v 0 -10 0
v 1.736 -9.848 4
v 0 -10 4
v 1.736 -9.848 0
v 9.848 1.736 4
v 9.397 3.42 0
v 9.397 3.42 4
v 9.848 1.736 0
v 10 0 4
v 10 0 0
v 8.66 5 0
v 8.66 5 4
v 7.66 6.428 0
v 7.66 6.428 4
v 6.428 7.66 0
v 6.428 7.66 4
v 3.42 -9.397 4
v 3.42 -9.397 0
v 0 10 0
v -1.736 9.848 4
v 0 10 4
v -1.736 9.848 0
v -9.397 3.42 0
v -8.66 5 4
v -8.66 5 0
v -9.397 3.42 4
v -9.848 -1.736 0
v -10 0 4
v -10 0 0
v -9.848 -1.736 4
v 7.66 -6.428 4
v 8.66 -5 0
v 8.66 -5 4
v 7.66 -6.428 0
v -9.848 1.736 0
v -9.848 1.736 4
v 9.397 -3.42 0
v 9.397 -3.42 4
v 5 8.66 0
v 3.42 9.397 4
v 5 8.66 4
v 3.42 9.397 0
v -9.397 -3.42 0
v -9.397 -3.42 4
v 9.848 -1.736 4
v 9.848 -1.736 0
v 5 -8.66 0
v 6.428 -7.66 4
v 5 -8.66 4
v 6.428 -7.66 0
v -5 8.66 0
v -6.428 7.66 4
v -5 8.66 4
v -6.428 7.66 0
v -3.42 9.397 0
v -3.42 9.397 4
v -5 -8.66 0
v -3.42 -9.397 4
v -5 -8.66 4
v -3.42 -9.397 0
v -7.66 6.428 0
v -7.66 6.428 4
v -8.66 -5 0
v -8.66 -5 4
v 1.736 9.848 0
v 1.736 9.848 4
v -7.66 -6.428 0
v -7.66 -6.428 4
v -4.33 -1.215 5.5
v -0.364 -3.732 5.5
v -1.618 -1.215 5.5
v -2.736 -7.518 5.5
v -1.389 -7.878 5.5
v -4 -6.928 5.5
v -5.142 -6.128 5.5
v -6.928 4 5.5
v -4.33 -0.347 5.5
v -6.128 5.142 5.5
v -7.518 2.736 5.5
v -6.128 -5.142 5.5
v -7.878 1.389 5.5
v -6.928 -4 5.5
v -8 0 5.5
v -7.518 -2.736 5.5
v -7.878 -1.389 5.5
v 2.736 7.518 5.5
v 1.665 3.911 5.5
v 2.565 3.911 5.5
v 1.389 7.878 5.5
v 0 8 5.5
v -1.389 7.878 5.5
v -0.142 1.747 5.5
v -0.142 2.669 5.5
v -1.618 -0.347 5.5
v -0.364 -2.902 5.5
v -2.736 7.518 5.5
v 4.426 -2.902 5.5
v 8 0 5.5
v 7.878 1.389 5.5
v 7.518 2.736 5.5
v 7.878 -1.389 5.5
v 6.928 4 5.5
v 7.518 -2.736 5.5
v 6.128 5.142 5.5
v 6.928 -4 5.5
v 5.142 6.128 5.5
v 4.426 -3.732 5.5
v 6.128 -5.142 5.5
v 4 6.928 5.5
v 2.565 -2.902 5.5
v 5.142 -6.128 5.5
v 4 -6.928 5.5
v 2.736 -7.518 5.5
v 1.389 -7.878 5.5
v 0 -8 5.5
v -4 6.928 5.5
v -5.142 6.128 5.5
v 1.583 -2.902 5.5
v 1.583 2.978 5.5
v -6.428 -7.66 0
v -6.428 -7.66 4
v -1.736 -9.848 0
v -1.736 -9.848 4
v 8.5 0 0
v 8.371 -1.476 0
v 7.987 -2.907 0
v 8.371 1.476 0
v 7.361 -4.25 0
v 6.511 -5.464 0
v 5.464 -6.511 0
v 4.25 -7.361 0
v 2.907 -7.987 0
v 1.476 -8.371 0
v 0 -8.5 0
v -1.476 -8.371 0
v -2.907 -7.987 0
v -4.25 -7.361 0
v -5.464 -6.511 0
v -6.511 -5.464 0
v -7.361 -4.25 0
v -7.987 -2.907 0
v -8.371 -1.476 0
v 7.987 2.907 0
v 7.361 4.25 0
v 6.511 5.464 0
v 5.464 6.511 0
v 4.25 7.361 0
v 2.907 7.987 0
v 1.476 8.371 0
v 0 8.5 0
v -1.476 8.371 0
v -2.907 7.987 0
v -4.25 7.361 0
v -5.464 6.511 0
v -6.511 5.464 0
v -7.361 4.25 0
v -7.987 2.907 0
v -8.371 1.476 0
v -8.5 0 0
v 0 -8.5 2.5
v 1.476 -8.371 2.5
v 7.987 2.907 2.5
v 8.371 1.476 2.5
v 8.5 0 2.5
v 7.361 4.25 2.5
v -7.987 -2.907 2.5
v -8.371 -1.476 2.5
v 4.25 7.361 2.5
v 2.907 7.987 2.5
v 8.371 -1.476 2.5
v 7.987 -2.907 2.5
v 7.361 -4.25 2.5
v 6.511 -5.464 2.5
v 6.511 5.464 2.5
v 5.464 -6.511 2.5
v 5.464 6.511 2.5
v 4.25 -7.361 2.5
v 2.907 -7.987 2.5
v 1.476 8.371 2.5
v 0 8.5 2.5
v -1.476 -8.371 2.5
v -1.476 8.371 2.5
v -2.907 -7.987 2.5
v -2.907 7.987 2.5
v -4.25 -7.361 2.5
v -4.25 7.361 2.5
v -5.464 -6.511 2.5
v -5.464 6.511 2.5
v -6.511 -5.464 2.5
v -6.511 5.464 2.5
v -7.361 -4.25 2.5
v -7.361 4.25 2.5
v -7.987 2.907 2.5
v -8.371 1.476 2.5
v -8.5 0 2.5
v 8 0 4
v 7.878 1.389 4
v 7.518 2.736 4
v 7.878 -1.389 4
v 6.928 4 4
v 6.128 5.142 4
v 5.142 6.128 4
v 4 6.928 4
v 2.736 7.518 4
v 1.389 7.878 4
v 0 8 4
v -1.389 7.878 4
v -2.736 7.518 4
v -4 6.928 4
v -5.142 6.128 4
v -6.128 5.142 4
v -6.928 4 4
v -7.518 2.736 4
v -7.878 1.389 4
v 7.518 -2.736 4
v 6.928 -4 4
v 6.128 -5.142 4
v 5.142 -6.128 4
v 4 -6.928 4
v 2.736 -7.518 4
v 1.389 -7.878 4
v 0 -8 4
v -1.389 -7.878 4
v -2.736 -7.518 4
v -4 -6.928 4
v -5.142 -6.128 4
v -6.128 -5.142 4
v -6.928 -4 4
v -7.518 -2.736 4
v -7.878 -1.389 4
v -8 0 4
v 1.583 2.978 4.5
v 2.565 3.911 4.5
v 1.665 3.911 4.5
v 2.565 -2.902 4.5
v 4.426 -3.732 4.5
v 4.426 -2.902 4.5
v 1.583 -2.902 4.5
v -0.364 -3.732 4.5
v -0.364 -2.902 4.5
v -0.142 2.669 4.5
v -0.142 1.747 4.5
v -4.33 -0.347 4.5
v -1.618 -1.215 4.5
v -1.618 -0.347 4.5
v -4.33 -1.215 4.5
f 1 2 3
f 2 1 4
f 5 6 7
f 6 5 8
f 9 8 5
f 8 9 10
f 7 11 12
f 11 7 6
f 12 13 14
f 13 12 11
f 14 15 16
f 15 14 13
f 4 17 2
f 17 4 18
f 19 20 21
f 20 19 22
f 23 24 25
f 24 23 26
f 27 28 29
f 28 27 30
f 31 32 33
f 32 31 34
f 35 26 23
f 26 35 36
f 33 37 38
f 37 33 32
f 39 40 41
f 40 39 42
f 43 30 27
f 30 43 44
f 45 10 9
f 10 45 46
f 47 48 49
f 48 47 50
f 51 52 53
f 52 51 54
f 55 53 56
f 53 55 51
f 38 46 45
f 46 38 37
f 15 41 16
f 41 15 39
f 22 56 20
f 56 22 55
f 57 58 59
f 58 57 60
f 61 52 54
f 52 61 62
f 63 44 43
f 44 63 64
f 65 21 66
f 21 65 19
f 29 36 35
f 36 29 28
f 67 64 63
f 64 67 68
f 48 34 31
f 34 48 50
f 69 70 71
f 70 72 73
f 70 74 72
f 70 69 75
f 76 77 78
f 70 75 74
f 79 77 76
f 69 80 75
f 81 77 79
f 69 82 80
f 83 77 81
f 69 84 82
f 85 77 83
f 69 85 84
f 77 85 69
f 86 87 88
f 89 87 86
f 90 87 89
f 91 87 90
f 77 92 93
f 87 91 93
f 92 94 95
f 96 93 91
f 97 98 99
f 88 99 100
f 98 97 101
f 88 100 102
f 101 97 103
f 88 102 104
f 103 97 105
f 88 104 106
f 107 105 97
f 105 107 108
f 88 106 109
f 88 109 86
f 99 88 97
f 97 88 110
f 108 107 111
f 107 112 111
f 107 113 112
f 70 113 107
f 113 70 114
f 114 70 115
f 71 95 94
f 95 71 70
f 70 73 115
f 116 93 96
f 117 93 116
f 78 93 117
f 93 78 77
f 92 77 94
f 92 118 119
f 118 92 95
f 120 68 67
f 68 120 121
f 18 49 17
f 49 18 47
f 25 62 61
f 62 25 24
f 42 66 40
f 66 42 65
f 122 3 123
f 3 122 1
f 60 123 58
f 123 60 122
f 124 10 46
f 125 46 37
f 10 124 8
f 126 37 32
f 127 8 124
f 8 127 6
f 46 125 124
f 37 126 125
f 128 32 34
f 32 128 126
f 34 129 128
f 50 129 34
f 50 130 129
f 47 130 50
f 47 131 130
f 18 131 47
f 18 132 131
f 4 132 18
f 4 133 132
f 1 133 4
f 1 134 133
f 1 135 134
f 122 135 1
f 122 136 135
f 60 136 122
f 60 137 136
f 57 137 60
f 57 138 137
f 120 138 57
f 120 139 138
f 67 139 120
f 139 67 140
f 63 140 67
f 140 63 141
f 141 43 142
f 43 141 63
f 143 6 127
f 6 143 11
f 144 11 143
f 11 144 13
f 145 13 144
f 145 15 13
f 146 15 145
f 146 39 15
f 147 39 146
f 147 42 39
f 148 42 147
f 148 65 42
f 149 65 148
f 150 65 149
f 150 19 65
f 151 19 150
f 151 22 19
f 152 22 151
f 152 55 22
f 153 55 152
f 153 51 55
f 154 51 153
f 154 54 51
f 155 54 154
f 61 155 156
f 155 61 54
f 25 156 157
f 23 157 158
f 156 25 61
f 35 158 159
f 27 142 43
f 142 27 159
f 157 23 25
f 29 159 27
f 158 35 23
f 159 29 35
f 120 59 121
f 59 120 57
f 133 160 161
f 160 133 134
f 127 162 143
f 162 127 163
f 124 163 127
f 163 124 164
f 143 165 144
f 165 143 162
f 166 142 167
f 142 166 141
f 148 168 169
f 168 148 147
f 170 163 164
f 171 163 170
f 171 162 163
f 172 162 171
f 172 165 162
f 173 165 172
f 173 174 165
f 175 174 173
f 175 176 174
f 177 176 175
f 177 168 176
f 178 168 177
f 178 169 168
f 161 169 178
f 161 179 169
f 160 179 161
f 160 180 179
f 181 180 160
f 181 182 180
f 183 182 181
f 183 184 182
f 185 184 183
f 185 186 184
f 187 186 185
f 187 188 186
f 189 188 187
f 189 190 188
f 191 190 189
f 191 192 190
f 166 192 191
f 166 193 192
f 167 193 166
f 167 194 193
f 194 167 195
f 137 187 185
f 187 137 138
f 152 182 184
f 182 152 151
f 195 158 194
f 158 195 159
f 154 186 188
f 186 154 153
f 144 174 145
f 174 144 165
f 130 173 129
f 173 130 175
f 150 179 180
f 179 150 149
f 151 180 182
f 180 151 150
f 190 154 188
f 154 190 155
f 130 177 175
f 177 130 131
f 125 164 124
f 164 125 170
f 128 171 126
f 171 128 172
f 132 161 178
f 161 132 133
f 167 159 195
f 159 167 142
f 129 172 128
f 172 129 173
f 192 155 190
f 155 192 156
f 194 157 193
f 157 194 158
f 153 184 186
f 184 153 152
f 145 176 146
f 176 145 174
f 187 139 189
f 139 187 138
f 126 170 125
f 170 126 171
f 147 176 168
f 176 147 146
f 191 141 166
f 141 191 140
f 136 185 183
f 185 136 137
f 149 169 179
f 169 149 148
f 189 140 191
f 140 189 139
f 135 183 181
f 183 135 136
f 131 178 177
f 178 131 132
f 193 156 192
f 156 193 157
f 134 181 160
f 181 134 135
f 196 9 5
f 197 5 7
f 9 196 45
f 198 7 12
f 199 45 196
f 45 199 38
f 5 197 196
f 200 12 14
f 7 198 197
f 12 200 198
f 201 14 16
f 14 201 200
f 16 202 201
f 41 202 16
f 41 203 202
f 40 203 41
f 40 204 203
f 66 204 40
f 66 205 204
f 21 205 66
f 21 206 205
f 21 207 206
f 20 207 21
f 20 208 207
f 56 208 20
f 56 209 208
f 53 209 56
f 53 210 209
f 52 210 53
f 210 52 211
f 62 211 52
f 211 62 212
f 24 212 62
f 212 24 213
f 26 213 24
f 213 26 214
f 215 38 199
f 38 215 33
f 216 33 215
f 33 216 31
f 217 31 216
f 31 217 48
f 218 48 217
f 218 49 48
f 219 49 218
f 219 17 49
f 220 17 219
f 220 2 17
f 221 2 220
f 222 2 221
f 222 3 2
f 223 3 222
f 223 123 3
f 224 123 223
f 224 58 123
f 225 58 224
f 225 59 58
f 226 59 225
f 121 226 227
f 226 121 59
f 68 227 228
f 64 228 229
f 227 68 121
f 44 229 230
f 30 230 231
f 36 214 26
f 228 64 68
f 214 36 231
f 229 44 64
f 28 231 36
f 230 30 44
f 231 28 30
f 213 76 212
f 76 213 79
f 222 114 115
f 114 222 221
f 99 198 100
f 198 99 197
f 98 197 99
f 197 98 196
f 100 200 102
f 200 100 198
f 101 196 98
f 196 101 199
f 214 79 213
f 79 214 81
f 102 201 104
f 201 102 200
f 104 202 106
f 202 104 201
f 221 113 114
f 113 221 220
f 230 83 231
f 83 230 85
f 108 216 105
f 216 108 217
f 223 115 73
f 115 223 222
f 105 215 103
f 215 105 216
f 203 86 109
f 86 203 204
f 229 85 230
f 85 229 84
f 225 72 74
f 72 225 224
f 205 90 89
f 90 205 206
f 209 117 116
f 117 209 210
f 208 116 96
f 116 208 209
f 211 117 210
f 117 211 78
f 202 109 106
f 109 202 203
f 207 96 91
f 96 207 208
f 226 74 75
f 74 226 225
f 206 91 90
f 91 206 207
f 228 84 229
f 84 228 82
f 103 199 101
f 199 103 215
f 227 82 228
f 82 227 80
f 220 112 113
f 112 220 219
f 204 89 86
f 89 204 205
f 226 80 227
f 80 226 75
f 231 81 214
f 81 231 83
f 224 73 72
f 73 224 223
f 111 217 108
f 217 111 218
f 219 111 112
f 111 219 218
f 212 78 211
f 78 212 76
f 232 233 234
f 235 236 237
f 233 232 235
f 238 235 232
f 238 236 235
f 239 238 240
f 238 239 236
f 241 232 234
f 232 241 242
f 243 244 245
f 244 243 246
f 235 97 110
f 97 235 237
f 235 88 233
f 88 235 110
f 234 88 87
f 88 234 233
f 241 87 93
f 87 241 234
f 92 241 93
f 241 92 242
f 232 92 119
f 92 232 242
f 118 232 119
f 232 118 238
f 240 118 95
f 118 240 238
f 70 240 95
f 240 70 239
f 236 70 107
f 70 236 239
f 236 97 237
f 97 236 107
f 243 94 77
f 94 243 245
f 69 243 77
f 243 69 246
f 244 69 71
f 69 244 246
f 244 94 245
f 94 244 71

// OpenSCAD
difference() {
	difference() {
		difference() {
			cylinder($fn = 36, h = 5.5000000000, r = 10);
			translate(v = [0, 0, -1]) {
				cylinder($fn = 36, h = 3.5000000000, r = 8.5000000000);
			}
		}
		translate(v = [0, 0, 4]) {
			difference() {
				cylinder($fn = 36, h = 3, r = 10.5000000000);
				cylinder($fn = 36, h = 3, r = 8);
			}
		}
	}
	translate(v = [0, 0, 4.5000000000]) {
		linear_extrude(height = 3) {
			text(halign = "center", size = 8, text = "-1", valign = "center");
		}
	}
}
